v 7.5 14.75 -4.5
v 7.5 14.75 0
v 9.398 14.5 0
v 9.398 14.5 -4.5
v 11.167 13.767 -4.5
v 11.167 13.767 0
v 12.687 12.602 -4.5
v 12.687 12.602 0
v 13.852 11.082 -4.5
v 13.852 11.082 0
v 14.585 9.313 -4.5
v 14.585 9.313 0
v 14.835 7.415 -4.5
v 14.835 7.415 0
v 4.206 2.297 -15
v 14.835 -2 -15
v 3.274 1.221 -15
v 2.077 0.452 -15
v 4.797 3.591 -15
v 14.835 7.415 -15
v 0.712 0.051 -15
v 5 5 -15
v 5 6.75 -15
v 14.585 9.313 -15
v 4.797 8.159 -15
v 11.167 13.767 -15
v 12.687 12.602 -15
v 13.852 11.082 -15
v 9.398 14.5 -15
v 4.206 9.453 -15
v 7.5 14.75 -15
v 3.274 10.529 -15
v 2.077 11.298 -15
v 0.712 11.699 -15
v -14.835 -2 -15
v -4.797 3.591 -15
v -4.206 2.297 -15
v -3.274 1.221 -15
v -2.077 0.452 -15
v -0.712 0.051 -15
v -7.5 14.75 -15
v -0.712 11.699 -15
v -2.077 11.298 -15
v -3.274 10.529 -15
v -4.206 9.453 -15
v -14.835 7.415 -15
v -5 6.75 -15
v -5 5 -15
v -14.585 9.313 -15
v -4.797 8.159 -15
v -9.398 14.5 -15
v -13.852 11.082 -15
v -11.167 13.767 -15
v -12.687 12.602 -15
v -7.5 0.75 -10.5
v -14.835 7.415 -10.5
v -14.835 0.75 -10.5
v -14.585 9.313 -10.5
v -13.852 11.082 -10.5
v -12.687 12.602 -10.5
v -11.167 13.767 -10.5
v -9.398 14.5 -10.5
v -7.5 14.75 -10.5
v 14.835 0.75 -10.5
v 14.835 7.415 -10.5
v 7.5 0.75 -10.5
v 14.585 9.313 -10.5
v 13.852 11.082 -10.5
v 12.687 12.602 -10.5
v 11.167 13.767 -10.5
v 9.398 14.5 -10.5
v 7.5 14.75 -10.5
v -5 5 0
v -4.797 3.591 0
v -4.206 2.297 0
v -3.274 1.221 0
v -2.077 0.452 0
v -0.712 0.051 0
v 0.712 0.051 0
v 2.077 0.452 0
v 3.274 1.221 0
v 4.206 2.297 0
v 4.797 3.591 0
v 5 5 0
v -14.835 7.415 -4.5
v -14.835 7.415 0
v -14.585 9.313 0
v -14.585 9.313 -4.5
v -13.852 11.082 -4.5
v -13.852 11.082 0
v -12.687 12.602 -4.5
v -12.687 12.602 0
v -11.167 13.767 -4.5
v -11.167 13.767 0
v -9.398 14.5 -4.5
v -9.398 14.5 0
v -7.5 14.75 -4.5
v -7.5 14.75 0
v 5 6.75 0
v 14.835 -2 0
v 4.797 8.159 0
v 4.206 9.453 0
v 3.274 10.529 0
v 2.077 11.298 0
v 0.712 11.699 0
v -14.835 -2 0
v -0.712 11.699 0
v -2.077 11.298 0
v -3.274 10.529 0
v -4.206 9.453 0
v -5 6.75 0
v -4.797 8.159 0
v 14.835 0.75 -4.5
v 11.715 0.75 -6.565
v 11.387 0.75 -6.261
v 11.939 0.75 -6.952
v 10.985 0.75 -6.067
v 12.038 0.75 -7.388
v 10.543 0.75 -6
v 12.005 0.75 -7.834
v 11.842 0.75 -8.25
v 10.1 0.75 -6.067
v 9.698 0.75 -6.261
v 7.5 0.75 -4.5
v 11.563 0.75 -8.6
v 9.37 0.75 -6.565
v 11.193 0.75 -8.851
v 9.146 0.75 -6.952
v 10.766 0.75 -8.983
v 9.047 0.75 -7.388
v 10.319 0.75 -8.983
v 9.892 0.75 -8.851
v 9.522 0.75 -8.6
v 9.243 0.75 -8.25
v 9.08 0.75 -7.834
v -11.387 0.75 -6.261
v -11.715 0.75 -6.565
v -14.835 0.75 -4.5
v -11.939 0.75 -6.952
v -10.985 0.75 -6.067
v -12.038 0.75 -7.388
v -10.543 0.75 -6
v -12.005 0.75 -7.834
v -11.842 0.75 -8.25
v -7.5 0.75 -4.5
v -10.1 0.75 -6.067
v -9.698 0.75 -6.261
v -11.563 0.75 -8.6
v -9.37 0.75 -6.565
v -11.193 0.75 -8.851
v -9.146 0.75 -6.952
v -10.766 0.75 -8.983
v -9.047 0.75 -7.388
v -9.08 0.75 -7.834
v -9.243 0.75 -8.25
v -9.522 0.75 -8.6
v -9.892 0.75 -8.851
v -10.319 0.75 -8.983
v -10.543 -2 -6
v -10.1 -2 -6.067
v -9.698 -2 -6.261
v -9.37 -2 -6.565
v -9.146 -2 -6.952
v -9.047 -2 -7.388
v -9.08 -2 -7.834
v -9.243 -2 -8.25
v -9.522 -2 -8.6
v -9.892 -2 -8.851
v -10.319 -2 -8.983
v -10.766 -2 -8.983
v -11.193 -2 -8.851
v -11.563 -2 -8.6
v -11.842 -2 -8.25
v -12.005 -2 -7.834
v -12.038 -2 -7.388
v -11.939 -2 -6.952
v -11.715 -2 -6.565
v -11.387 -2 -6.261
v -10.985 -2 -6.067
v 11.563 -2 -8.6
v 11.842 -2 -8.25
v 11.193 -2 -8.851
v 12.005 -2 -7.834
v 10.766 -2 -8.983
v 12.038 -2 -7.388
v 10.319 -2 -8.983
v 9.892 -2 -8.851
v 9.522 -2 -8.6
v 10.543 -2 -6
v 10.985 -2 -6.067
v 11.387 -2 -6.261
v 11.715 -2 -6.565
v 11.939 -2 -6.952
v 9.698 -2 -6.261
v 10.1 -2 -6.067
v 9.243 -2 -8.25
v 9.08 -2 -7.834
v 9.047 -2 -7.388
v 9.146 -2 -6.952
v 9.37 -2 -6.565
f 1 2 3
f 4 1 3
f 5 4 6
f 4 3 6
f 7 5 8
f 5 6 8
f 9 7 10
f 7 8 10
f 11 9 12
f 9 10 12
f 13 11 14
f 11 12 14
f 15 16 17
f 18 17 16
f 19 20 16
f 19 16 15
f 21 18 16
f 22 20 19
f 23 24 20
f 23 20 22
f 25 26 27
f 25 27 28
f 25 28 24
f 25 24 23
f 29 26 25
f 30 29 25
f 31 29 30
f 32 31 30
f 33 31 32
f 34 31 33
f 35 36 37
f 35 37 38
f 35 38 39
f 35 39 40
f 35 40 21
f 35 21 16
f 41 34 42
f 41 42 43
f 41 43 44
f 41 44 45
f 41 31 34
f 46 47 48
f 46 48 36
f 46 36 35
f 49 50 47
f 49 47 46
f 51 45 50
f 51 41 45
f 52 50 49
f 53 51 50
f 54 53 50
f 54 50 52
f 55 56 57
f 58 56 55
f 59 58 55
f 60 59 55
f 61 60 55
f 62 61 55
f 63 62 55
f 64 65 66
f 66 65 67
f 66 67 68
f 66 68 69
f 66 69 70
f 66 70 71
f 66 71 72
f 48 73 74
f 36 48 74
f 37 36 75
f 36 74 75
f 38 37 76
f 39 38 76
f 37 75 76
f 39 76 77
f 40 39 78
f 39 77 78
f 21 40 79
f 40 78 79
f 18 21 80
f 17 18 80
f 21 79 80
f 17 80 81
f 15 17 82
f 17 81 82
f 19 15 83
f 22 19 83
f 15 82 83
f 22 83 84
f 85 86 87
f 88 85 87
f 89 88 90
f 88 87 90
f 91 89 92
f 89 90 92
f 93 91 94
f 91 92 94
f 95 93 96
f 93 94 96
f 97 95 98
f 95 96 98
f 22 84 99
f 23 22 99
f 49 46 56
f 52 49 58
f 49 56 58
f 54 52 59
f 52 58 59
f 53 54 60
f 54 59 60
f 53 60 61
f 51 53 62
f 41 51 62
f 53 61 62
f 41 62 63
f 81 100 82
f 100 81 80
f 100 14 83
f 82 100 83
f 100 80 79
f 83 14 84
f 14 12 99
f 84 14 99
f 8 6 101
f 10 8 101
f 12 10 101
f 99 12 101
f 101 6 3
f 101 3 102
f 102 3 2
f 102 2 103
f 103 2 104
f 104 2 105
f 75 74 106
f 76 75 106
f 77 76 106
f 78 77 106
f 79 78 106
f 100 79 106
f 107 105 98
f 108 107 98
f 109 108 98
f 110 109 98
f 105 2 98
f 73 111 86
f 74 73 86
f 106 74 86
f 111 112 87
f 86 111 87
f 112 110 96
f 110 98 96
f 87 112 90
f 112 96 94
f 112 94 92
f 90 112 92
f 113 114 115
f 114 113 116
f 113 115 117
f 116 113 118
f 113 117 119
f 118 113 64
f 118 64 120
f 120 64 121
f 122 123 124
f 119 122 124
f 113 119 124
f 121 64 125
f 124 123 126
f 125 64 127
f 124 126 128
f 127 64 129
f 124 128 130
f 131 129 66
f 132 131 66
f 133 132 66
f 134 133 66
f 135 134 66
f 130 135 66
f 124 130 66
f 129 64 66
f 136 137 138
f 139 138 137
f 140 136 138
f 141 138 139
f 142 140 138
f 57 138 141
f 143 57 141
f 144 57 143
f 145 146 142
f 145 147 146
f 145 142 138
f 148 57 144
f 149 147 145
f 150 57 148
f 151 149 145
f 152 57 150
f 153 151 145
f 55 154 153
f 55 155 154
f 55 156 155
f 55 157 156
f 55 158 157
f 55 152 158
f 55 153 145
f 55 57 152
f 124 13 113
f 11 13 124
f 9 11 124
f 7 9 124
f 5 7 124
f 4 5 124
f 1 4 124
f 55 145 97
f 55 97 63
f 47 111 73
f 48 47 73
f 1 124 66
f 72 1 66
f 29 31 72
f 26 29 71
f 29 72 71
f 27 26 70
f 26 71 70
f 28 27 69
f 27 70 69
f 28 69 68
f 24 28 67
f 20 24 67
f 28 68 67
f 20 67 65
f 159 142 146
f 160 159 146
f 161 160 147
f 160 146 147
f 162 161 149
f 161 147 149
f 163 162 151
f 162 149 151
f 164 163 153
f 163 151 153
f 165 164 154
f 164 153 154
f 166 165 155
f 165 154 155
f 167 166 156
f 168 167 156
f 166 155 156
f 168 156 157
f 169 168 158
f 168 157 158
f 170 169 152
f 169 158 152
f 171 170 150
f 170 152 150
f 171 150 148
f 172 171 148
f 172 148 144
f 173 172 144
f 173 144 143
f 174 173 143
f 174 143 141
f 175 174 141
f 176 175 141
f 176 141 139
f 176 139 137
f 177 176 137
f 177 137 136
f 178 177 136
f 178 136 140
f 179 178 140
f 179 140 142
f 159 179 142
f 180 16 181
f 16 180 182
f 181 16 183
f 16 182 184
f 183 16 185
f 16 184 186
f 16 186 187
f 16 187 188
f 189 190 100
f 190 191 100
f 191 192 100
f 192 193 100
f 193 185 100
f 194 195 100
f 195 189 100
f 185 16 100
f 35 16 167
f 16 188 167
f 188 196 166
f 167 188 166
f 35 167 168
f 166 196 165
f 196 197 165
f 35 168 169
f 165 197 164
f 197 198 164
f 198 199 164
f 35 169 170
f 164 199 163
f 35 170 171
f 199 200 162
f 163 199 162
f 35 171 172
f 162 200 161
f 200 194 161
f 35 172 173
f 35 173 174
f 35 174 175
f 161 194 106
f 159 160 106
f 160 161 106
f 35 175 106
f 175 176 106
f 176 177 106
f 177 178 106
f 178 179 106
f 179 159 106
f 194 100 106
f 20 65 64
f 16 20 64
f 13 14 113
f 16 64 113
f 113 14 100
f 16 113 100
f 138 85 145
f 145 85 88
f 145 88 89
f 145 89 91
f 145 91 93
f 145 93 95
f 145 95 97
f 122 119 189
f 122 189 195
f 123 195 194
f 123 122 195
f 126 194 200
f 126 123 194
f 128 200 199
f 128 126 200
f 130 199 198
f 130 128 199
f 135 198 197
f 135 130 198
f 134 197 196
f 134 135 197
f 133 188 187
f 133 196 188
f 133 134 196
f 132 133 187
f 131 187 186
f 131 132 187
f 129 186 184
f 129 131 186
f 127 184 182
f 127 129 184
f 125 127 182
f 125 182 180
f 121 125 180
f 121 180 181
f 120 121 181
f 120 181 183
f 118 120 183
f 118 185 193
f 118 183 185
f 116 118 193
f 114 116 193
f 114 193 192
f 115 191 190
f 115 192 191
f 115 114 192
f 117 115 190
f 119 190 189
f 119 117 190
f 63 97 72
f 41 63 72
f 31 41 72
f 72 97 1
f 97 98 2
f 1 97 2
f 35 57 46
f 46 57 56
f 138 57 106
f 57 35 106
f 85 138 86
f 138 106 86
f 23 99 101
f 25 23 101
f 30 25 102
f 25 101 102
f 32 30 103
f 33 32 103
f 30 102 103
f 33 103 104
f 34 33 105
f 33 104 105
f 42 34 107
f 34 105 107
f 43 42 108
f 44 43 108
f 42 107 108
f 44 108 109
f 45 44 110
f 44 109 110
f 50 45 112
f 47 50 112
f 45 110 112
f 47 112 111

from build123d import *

# Parameters (mm, degrees)
BOSS_EXTRUDE1_DEPTH = 15
SKETCH2_W           = 7.335
SKETCH2_H           = 6
CUT_EXTRUDE1_DEPTH  = 14
SKETCH2_3_R         = 1.5
CUT_EXTRUDE2_DEPTH  = 27.937700811


with BuildPart() as part:
    # Sketch1 → Boss-Extrude1 (new body)
    with BuildSketch(Plane.XY):
        with BuildLine():
            Line((0, -2), (-14.835, -2))
            Line((-14.835, -2), (-14.835, 7.415))
            ThreePointArc((-14.835, 7.415), (-12.68662824, 12.60162824), (-7.5, 14.75))
            Line((-7.5, 14.75), (7.5, 14.75))
            ThreePointArc((7.5, 14.75), (12.68662824, 12.60162824), (14.835, 7.415))
            Line((14.835, 7.415), (14.835, -2))
            Line((14.835, -2), (0, -2))
        make_face()
        with BuildLine():
            Line((-5, 6.75), (-5, 5))
            ThreePointArc((-5, 5), (0, 0), (5, 5))
            Line((5, 5), (5, 6.75))
            ThreePointArc((5, 6.75), (0, 11.75), (-5, 6.75))
        make_face(mode=Mode.SUBTRACT)
    extrude(amount=-BOSS_EXTRUDE1_DEPTH)

    # Sketch2 → Cut-Extrude1 (cut)
    with BuildSketch(Plane(origin=(0, 14.75, 0), x_dir=(1, 0, 0), z_dir=(0, 1, 0))):
        with Locations((-11.1675, 7.5)):
            Rectangle(SKETCH2_W, SKETCH2_H)
    cut_extrude1 = extrude(amount=-CUT_EXTRUDE1_DEPTH, mode=Mode.SUBTRACT)

    # Sketch2<3> → Cut-Extrude2 (cut, through all)
    with BuildSketch(Plane(origin=(0, 14.75, 0), x_dir=(1, 0, 0), z_dir=(0, 1, 0))):
        with Locations((-10.54250606, 7.5)):
            Circle(SKETCH2_3_R)
    cut_extrude2 = extrude(amount=-CUT_EXTRUDE2_DEPTH, mode=Mode.SUBTRACT)

    # Mirror1: Cut-Extrude1, Cut-Extrude2 across plane
    add(cut_extrude1.mirror(Plane(origin=(0, 0, 0), x_dir=(0, 0, 1), z_dir=(1, 0, 0))), mode=Mode.SUBTRACT)
    add(cut_extrude2.mirror(Plane(origin=(0, 0, 0), x_dir=(0, 0, 1), z_dir=(1, 0, 0))), mode=Mode.SUBTRACT)


solid = part.part
